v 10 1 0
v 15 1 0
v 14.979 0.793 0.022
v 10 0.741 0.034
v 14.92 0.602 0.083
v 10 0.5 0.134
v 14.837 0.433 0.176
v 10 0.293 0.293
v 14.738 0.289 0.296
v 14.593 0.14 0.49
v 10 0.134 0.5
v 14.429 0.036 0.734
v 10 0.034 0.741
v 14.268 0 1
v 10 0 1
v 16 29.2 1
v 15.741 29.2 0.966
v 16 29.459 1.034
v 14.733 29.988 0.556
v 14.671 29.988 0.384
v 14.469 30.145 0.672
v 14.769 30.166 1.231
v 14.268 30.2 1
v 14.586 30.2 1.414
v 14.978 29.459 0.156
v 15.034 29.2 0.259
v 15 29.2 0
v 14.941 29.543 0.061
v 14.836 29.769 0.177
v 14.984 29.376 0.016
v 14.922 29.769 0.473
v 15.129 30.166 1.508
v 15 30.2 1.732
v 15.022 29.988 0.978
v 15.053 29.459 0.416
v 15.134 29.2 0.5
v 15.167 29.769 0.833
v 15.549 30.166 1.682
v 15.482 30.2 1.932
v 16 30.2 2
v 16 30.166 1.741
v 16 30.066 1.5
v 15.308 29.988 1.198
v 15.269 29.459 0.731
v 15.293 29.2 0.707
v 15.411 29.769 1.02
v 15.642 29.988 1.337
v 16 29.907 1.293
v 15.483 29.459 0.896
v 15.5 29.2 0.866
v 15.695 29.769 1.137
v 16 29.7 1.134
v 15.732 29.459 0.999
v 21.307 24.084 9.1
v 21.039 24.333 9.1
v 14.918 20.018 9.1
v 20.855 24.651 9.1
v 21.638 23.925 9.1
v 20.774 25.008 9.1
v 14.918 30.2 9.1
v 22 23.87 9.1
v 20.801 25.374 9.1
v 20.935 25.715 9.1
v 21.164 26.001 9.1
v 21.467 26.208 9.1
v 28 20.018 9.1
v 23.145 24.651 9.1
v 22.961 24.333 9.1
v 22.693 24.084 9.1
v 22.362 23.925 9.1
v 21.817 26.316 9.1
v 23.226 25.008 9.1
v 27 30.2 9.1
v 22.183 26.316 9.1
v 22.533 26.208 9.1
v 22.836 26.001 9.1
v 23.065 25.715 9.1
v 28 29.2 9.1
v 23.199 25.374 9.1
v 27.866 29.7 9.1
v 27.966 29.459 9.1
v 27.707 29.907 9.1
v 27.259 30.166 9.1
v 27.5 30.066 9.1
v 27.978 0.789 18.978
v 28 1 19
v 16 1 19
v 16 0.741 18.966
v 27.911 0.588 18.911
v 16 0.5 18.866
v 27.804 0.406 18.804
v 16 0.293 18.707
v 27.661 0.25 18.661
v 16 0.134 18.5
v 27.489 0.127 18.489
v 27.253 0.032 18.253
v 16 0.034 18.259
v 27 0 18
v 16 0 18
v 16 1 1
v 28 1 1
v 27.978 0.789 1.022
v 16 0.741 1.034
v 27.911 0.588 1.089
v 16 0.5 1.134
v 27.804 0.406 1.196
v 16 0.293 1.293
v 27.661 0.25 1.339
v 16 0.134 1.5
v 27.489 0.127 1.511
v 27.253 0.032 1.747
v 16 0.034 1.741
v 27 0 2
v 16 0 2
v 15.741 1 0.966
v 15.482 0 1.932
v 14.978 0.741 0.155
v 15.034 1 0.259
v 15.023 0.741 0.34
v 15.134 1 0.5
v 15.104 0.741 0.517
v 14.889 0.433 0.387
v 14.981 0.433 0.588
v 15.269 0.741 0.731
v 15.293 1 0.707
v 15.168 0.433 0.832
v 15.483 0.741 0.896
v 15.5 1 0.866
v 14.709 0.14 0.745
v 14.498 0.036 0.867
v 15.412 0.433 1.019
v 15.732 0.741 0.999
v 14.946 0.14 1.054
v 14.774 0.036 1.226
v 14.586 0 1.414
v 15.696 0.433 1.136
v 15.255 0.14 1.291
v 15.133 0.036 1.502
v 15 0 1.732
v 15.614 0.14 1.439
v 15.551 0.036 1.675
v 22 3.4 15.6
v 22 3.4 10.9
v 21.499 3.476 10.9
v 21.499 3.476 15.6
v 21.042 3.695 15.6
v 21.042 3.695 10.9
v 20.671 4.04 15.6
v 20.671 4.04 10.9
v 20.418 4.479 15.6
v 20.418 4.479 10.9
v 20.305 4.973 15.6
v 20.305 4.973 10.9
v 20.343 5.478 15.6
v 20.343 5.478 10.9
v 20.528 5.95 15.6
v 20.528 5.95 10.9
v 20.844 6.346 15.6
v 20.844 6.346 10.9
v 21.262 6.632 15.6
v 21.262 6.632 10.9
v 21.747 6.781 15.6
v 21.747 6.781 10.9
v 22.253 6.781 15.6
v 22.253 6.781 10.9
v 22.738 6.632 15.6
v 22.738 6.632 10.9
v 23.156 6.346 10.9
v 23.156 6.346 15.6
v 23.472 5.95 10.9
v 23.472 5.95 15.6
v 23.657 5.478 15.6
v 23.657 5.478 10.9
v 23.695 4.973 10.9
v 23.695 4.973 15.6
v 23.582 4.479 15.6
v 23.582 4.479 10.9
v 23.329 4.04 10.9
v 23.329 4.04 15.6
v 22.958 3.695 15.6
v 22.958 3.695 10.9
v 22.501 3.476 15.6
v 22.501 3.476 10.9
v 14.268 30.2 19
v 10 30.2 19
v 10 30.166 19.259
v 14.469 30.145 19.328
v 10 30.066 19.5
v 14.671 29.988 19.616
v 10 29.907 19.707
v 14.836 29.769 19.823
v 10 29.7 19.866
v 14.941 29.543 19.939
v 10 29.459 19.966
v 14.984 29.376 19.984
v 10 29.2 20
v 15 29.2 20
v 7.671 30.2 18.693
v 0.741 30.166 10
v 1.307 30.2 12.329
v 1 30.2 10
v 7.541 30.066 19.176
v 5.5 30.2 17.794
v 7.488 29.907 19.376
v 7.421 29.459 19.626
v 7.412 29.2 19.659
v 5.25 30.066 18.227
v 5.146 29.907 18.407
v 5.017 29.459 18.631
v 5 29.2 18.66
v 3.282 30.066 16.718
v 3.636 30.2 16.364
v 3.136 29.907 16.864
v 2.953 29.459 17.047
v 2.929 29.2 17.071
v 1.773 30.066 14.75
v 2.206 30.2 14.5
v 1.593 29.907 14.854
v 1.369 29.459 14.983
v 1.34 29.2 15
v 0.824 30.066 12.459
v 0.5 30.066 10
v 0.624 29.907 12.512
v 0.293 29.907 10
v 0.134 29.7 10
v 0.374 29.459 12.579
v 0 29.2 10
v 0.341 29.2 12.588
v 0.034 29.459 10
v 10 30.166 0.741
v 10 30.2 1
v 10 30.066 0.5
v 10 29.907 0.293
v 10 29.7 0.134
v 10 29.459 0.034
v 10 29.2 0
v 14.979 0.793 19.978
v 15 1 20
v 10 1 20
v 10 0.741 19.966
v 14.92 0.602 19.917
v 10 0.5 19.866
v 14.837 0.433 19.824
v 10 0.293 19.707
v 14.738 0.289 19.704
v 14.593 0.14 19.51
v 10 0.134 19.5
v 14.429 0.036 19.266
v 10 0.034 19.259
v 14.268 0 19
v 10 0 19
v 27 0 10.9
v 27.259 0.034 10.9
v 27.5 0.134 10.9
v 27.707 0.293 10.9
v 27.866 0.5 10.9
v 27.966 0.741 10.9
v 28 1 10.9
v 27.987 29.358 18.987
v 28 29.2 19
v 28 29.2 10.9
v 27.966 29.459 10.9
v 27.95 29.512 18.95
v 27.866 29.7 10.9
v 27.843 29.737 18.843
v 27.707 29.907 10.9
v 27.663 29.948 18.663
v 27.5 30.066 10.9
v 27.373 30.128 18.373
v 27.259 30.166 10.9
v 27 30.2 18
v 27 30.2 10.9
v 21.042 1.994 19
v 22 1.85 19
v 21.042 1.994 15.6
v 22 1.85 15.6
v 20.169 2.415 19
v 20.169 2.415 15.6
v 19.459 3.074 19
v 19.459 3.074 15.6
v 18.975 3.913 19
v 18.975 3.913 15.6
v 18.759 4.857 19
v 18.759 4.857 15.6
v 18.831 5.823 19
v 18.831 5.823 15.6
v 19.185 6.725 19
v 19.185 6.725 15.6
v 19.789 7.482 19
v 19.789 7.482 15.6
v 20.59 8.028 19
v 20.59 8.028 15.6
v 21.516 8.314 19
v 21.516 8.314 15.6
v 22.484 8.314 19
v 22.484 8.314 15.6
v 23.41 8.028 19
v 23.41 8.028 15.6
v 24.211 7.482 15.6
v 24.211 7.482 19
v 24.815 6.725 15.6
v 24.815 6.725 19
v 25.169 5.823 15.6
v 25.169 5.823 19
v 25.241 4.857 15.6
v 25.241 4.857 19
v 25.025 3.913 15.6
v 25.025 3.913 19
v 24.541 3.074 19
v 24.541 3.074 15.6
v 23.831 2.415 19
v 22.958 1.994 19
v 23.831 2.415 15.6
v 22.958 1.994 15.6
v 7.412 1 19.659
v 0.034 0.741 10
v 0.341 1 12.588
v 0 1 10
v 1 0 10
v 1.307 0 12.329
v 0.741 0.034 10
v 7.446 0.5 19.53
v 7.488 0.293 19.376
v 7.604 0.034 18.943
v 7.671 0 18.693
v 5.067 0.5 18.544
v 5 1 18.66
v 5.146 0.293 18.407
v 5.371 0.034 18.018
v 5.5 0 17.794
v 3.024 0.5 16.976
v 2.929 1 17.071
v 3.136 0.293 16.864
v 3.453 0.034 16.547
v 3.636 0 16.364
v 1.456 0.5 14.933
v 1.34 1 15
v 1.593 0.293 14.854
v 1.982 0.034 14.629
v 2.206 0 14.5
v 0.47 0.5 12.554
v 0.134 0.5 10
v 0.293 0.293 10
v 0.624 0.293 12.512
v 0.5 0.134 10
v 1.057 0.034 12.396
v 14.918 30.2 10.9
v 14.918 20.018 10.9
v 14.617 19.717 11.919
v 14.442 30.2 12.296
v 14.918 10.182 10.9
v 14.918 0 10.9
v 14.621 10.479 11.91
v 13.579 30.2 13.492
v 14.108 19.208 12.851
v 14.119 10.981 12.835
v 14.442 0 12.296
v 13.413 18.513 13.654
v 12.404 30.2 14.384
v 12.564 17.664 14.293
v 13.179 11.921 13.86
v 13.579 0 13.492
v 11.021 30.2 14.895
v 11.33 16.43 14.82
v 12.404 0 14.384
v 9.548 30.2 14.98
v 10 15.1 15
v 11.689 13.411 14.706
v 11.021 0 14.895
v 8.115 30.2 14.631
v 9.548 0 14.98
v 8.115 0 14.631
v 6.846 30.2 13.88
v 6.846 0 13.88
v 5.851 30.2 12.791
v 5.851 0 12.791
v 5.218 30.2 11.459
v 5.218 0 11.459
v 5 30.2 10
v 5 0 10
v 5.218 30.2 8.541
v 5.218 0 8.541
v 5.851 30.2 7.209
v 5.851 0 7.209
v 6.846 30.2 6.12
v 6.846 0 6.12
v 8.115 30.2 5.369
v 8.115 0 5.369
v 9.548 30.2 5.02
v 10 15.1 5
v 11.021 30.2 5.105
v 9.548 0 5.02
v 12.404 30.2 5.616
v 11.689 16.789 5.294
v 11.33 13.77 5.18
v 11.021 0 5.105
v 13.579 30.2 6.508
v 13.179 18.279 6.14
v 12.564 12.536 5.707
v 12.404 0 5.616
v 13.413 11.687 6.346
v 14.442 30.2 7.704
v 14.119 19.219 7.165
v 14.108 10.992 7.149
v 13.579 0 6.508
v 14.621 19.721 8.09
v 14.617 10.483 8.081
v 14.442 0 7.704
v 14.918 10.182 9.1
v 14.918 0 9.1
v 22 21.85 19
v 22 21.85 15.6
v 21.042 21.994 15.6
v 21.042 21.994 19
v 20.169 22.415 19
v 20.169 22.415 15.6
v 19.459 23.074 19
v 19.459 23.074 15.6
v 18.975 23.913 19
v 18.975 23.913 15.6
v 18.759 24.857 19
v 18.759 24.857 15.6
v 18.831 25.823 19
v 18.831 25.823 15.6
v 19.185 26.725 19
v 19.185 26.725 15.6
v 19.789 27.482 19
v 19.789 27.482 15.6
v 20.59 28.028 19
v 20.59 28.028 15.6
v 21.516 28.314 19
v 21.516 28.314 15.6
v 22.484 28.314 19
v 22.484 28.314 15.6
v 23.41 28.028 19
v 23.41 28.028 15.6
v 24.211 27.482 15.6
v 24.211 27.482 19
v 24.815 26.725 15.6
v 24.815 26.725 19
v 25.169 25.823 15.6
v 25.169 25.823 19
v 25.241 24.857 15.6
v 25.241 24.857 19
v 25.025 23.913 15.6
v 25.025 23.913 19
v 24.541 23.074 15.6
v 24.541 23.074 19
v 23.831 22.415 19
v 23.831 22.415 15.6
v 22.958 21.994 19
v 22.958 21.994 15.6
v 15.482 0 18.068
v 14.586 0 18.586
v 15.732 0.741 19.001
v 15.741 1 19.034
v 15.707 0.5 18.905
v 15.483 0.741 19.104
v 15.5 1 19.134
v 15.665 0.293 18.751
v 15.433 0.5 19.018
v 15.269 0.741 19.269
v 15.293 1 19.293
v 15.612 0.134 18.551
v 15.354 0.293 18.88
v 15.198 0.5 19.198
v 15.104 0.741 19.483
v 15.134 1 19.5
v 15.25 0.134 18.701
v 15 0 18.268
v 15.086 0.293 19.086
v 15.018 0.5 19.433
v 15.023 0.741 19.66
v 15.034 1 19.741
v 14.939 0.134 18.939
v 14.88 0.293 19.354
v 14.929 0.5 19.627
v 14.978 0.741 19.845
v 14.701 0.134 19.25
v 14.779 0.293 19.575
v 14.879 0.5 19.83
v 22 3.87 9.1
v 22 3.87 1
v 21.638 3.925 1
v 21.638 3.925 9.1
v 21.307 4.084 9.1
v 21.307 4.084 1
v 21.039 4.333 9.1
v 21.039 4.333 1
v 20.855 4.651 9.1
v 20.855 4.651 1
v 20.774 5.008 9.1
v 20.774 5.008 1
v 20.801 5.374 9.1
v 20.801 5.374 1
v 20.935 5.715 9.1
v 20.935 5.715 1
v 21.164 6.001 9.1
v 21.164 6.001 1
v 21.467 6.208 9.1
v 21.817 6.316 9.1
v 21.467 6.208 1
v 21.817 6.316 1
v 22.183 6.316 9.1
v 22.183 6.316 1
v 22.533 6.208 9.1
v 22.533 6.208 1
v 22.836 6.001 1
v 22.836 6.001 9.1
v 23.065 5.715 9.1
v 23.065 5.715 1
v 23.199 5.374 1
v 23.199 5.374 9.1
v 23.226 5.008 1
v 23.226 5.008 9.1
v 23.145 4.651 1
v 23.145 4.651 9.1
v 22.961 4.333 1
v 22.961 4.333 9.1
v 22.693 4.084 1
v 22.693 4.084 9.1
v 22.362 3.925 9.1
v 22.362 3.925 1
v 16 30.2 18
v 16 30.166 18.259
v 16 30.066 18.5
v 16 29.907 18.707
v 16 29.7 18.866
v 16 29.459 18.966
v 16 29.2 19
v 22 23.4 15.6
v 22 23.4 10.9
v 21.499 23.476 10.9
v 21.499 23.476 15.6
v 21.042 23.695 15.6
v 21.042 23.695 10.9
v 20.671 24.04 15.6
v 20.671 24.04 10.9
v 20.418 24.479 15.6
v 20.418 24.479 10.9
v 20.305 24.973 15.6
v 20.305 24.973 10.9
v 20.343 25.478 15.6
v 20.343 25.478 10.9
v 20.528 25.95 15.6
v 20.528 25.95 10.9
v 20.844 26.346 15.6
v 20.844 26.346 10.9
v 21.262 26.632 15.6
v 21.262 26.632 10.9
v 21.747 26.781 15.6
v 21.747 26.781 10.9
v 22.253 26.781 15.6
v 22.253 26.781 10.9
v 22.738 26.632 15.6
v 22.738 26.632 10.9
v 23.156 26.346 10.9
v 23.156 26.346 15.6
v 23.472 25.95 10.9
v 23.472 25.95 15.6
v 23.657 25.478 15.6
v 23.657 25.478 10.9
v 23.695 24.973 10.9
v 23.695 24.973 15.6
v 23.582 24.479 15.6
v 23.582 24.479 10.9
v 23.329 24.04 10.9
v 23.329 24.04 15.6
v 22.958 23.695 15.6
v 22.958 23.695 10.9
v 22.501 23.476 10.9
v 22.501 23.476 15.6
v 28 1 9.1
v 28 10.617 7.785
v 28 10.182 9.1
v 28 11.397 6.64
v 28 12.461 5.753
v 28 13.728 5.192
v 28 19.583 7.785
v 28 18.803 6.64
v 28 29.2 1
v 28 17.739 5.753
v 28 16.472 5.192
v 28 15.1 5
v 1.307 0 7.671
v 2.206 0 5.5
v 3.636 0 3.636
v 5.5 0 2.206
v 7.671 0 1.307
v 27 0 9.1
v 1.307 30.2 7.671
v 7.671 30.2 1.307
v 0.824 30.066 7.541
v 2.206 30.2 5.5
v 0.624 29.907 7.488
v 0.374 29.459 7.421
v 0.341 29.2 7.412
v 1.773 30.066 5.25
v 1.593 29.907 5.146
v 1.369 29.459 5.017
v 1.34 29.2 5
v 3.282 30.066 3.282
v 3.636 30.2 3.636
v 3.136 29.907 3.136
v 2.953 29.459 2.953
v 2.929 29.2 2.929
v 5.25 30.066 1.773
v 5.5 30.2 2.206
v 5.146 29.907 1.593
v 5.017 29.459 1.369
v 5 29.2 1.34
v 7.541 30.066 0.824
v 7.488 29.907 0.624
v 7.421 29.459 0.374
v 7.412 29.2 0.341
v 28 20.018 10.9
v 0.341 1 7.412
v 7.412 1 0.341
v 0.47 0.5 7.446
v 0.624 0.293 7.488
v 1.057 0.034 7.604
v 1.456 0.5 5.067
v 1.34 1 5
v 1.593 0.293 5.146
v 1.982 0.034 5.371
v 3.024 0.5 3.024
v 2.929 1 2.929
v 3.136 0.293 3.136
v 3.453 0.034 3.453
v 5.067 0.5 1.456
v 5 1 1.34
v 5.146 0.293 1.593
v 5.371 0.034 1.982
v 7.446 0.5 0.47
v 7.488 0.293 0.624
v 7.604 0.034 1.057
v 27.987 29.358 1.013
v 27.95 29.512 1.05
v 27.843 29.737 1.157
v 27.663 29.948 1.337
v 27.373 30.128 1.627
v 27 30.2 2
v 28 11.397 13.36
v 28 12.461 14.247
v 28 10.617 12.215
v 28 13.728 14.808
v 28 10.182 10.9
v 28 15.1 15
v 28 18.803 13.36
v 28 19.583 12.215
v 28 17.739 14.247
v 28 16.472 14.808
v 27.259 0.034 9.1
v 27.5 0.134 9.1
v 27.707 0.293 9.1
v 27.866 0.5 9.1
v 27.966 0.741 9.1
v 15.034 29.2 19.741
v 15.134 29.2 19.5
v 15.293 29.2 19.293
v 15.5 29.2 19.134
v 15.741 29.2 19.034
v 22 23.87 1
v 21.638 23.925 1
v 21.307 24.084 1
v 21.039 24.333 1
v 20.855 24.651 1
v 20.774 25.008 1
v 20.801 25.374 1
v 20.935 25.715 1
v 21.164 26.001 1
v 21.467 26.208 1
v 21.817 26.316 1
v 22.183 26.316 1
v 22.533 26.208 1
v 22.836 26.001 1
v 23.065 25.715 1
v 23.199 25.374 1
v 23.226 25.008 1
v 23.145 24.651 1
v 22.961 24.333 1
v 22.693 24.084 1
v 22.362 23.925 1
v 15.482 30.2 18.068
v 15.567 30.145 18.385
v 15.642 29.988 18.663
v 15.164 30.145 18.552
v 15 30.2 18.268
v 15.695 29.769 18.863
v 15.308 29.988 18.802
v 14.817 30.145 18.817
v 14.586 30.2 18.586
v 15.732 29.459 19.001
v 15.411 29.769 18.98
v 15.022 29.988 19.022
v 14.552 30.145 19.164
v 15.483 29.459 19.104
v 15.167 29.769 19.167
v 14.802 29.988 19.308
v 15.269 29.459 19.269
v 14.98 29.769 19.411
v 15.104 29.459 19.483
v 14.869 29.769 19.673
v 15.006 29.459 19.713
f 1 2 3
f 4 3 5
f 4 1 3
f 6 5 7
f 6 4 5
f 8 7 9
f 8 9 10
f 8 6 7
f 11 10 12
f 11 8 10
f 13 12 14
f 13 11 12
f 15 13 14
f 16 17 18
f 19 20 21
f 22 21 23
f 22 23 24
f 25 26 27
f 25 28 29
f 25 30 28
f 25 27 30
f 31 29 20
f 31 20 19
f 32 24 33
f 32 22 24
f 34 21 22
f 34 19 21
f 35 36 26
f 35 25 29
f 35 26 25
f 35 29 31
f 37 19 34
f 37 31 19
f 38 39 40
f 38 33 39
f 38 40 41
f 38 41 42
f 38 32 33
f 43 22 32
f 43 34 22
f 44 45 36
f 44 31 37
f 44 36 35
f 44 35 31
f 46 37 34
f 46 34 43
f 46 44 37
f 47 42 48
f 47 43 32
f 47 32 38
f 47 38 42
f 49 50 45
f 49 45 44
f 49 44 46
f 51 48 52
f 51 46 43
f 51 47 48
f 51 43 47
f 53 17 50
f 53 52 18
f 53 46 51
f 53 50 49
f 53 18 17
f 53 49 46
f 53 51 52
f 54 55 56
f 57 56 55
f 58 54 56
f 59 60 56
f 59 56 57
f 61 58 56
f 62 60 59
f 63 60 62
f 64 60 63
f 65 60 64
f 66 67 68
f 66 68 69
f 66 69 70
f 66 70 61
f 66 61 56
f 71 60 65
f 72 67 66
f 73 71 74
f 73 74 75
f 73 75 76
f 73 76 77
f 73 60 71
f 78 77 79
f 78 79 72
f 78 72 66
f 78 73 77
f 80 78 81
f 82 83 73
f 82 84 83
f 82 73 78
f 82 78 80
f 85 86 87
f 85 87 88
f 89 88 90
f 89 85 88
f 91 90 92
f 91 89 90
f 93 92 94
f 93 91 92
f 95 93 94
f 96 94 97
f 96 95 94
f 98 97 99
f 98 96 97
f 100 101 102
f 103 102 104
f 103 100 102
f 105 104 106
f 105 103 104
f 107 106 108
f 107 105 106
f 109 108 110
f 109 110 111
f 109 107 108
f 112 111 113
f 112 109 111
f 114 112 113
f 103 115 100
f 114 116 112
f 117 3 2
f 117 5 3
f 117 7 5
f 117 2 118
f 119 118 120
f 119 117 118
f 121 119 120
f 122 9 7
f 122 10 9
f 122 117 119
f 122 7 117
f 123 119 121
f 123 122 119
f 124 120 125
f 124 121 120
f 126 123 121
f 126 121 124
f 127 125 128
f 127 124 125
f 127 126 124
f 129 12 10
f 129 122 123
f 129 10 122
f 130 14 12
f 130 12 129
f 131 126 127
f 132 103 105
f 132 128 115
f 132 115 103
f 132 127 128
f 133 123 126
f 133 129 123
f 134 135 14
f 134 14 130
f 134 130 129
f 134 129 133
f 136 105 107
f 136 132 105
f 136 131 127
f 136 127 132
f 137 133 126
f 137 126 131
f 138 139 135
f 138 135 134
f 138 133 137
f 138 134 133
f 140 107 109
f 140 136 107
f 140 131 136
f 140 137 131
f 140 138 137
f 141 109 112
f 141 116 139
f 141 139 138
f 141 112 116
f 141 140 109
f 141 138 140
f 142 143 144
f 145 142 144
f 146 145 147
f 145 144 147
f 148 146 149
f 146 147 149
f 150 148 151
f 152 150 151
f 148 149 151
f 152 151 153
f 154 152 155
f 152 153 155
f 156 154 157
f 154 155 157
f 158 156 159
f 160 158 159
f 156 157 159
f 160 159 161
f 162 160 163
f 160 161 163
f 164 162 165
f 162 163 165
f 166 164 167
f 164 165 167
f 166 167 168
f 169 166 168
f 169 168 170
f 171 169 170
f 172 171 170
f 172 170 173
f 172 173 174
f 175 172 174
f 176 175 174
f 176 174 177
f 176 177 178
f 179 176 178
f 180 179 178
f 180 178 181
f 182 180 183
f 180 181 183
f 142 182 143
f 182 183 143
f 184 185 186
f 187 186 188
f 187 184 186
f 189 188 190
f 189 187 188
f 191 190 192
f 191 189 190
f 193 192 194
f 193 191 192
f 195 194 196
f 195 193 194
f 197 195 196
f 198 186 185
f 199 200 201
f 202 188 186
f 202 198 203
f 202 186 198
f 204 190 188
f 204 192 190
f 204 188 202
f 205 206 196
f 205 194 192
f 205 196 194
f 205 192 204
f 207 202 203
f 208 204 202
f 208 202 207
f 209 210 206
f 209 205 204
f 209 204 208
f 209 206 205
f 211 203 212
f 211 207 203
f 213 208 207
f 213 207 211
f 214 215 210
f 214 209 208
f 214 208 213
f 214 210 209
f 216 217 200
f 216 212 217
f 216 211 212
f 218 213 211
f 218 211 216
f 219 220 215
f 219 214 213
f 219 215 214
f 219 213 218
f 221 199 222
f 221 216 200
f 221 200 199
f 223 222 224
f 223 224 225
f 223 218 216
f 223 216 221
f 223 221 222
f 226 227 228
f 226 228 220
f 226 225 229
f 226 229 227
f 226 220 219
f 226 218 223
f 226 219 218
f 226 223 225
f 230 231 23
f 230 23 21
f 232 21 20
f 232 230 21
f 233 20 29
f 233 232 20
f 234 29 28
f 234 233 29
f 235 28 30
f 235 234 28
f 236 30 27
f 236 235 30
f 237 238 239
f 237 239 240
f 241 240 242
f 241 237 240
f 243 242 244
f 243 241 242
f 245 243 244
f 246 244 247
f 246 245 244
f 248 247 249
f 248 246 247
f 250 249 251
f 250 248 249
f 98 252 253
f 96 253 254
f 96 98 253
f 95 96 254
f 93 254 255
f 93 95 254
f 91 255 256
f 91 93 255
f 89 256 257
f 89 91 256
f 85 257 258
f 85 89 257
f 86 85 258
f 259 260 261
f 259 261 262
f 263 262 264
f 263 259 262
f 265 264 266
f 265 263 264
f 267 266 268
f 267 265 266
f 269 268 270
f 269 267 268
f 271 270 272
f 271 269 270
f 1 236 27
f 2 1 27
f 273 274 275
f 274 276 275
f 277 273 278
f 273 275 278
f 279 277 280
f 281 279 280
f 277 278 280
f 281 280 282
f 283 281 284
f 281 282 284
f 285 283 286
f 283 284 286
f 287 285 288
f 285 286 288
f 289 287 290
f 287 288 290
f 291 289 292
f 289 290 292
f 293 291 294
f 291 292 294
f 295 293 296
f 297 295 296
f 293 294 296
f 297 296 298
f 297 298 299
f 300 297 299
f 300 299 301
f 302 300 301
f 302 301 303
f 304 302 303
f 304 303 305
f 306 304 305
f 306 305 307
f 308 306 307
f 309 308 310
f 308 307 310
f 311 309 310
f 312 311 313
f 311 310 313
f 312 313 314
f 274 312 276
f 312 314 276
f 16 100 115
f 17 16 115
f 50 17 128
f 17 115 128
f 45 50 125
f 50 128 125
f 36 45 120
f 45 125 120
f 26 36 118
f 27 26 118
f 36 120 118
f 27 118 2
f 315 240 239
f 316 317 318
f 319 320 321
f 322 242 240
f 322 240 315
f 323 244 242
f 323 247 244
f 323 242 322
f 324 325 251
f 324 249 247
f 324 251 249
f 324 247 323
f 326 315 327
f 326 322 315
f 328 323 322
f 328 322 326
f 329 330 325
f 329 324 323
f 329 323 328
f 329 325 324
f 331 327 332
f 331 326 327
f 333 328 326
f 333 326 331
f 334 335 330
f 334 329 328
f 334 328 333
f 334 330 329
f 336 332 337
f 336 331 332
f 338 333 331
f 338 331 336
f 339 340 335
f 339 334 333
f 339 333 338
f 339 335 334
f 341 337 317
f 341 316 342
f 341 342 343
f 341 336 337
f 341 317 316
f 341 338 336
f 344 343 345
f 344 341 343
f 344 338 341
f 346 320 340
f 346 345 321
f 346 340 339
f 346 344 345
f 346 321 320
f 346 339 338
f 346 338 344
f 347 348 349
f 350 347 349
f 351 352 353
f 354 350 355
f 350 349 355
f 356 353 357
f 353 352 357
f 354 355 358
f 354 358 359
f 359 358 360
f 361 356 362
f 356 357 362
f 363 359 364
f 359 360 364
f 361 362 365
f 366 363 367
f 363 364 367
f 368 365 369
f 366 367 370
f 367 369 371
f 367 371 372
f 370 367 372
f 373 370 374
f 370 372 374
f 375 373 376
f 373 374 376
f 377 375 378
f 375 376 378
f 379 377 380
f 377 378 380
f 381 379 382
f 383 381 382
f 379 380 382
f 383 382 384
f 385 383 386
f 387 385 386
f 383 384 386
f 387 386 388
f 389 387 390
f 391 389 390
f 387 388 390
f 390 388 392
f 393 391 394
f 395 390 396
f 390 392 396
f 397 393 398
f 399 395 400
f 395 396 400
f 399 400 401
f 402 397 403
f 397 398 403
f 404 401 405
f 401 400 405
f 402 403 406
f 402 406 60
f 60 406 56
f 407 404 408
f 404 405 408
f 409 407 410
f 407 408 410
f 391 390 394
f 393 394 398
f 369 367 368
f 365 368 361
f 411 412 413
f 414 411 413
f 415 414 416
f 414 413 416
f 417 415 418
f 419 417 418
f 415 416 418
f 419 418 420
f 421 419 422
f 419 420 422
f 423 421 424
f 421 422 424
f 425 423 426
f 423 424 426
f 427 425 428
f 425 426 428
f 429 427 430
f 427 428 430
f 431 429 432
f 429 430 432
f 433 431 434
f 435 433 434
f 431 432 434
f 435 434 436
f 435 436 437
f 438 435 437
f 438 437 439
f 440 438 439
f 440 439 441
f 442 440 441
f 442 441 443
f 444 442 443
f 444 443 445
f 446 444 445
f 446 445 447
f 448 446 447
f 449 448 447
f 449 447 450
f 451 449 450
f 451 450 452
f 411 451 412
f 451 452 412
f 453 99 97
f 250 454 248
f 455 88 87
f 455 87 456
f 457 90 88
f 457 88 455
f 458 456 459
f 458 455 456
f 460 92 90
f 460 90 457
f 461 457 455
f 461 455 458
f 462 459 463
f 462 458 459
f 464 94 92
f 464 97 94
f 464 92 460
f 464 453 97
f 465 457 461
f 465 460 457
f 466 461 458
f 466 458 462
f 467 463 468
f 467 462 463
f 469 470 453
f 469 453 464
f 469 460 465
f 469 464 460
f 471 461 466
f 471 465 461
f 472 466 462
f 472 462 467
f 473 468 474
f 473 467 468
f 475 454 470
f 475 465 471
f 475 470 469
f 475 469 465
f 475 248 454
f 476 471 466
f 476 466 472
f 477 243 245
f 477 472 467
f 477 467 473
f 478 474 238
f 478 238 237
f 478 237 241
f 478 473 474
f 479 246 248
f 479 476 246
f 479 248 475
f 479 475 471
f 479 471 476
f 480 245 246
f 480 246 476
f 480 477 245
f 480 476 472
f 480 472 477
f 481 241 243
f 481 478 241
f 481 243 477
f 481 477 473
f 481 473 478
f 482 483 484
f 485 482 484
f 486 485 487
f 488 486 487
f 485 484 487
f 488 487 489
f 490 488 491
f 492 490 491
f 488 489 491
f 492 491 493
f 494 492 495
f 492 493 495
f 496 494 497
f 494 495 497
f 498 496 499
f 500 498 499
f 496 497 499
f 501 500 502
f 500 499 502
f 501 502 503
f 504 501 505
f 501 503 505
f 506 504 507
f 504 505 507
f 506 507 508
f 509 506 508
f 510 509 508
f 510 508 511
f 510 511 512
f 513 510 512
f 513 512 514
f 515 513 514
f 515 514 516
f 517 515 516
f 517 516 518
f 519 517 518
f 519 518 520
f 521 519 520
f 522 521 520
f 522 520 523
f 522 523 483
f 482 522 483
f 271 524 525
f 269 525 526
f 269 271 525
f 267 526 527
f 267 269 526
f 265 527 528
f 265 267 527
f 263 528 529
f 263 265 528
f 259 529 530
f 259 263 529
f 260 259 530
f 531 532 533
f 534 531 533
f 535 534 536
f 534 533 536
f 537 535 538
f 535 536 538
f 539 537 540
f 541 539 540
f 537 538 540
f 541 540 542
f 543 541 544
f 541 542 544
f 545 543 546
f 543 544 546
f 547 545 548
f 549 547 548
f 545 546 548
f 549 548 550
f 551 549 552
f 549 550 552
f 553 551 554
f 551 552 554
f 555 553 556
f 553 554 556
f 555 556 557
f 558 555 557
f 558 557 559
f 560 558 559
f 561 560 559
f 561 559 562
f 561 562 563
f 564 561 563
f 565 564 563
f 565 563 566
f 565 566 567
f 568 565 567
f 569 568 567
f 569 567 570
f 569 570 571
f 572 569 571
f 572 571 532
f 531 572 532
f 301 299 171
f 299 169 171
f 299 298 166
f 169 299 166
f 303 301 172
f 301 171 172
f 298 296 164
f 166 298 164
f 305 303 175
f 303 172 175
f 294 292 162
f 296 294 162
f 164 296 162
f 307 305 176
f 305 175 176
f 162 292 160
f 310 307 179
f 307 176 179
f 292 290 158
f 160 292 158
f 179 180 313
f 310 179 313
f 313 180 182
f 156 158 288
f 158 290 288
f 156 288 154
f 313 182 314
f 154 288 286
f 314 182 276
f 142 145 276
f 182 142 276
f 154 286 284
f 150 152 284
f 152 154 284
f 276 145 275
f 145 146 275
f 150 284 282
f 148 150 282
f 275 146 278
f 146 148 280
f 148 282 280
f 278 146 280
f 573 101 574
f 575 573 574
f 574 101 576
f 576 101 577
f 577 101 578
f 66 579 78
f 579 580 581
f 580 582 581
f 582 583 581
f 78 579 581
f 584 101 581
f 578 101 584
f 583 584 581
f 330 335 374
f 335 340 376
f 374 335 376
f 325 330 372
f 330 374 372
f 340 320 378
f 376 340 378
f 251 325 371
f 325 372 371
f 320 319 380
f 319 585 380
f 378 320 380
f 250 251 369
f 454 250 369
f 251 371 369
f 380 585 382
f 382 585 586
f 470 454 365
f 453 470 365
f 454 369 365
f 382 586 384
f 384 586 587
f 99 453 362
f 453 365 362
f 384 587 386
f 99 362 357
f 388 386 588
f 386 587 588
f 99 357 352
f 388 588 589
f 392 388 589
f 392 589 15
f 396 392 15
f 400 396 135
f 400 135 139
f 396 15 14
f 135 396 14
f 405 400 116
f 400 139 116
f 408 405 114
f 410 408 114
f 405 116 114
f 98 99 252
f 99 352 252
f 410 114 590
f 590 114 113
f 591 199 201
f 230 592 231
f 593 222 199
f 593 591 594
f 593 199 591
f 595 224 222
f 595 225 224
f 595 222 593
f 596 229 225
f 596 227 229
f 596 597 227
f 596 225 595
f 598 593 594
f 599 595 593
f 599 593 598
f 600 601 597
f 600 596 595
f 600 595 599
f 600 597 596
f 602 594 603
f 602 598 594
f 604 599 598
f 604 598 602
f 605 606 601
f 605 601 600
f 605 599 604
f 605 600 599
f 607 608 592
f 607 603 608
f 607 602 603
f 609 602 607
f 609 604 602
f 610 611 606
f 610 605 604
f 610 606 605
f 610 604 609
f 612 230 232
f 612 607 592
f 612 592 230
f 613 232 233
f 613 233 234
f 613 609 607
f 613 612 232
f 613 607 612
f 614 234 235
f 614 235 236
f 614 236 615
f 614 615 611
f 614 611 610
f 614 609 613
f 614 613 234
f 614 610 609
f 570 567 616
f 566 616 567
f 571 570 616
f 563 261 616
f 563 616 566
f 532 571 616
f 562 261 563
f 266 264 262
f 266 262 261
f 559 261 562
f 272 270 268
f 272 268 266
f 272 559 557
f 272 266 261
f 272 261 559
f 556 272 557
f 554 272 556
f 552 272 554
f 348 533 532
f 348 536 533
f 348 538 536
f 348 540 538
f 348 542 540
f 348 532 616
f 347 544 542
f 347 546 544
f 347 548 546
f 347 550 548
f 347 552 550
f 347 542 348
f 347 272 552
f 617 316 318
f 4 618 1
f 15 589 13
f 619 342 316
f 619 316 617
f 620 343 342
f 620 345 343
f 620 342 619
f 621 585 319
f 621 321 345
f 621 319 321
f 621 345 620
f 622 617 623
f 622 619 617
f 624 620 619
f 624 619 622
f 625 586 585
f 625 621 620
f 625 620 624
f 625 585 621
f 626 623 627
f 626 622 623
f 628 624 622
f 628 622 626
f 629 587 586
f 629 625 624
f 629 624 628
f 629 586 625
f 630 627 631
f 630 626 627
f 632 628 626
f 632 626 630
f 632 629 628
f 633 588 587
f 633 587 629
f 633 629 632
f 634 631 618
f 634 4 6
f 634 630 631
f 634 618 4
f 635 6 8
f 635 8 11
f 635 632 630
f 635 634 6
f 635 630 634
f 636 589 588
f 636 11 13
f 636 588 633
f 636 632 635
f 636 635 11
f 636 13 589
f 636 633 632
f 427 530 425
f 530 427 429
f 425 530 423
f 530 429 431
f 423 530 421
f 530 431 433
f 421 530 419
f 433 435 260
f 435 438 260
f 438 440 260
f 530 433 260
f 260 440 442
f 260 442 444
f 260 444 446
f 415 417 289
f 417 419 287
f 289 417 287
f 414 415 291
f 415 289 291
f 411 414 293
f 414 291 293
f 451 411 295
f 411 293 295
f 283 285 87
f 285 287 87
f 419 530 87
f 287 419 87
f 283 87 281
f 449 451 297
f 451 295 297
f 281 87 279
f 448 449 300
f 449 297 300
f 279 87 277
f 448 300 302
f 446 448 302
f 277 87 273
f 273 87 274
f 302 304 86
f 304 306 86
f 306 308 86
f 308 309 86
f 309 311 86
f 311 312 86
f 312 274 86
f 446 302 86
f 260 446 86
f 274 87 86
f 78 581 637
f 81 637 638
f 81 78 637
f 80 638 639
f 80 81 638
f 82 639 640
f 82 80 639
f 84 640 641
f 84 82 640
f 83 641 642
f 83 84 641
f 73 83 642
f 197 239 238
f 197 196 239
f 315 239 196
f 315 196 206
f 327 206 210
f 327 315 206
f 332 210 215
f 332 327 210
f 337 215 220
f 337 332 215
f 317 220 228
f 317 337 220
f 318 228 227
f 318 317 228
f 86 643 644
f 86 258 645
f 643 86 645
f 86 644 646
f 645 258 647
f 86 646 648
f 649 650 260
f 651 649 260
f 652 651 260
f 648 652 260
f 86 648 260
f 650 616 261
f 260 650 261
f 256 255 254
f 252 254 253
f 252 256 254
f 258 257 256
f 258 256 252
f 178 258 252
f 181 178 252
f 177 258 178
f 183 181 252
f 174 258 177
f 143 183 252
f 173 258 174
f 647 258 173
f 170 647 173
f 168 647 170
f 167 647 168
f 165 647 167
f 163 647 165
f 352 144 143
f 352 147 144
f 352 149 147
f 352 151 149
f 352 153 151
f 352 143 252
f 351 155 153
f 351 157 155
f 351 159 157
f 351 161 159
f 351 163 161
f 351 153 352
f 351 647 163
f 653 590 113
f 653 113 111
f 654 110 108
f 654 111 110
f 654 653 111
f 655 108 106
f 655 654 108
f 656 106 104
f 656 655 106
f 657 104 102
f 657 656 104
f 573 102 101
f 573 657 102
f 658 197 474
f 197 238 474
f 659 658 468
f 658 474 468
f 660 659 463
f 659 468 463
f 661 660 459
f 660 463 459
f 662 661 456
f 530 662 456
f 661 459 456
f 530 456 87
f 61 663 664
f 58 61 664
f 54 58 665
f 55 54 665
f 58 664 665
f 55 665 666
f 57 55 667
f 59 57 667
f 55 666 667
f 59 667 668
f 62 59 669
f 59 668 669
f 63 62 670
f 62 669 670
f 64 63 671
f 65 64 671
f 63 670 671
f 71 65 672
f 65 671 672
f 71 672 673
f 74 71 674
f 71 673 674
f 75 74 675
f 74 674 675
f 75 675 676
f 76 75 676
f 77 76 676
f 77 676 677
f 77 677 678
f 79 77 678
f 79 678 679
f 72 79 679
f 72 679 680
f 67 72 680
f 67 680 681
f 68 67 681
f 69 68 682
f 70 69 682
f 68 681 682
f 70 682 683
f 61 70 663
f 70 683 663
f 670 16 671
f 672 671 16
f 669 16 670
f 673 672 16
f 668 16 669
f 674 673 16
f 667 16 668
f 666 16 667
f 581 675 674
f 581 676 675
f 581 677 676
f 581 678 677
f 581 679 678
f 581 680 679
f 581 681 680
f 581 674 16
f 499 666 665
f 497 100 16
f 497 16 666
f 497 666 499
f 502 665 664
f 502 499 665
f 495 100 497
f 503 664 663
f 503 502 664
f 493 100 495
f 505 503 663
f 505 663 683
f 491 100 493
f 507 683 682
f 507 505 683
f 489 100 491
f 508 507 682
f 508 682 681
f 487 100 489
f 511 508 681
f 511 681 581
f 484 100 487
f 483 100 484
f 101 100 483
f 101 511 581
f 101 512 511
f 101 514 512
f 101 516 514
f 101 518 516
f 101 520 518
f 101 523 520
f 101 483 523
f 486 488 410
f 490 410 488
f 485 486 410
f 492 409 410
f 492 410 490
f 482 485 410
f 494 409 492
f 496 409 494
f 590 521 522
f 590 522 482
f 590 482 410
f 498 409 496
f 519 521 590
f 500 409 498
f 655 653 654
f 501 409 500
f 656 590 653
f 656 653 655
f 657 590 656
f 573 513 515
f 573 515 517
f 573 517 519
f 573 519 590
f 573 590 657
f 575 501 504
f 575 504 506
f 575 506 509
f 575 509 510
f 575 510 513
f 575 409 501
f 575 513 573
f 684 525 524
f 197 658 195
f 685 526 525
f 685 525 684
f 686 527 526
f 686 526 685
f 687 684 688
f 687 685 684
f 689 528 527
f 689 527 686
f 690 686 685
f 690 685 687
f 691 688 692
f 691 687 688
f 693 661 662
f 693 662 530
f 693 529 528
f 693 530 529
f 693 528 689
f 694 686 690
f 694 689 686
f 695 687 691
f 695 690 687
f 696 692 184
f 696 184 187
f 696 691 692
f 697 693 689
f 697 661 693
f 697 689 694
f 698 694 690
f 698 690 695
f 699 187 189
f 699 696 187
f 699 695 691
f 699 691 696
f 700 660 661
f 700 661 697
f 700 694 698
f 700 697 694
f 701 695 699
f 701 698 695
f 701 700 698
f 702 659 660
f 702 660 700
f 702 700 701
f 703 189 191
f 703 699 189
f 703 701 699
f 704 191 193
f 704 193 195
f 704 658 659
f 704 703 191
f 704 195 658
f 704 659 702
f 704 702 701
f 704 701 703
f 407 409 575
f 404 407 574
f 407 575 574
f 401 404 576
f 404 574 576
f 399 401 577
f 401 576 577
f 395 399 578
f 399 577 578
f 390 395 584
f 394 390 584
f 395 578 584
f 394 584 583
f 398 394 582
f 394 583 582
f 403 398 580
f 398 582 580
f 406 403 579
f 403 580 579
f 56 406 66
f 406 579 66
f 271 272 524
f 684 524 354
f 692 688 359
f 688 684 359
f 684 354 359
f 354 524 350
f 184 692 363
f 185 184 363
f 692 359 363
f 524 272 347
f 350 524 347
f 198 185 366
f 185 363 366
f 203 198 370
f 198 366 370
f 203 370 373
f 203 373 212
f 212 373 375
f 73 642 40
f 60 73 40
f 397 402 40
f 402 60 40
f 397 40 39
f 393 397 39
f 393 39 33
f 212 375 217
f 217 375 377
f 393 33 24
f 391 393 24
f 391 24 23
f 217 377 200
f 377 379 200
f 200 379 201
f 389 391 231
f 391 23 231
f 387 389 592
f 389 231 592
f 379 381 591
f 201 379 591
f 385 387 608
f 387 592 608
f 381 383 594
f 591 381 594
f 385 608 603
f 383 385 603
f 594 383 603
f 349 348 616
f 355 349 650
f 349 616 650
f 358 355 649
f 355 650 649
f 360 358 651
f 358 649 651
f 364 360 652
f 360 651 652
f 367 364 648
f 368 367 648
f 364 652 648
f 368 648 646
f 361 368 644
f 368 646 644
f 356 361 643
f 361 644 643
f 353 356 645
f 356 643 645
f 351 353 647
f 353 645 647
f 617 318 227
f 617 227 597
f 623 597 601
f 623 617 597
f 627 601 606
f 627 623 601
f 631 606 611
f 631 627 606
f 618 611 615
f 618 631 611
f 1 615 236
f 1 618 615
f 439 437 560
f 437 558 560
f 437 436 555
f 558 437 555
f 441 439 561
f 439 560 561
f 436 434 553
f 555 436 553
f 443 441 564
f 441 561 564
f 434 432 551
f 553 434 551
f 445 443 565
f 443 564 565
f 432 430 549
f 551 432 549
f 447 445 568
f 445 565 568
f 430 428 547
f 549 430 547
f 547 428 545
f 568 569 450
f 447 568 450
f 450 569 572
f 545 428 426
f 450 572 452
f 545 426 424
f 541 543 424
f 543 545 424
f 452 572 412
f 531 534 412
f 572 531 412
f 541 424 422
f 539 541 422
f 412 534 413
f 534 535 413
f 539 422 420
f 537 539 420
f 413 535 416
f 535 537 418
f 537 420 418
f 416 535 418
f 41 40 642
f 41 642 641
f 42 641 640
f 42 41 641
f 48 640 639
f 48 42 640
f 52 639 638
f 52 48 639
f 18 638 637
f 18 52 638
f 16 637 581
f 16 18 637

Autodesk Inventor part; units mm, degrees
ref_plane "YZ Plane" through (0, 0, 0) normal (1, 0, 0) x (0, 1, 0)
ref_plane "XZ Plane" through (0, 0, 0) normal (0, 1, 0) x (-1, 0, 0)
ref_plane "XY Plane" through (0, 0, 0) normal (0, 0, 1) x (1, 0, 0)
sketch "Sketch1" plane through (0, 0, 0) normal (0, 0, 1) x (1, 0, 0)
  line L0 (28, 30.2) -> (0, 30.2)
  line L1 (0, 30.2) -> (0, 0)
  line L2 (0, 15.1) -> (28, 15.1) construction
  line L3 (28, 0) -> (28, 30.2)
  line L4 (0, 0) -> (28, 0)
  line L5 (20, 15.1) -> (20, 30.2) construction
  dimension "d0" = 30.2
  dimension "d3" = 28
  dimension "d26" = 20
  dimension "d27" = 8
extrude "Extrusion1" add sketch "Sketch1" along normal blind 20
sketch "Sketch2" plane through (0, 30.2, 0) normal (0, 1, 0) x (1, 0, 0)
  line L0 (0, 0) -> (0, -20) construction
  line L1 (0, 0) -> (28, 0) construction
  line L2 (10, -10) -> (0, -10) construction
  line L3 (0, 0) -> (0, -20) construction
  dimension "d48" = 10
hole "Hole1" at (10, 30.2, 10) direction (0, -1, 0) diameter 10 end through all
sketch "Sketch3" plane through (0, 0, 0) normal (0, -1, 0) x (1, 0, 0)
  line L0 (28, 20) -> (15, 20)
  line L1 (16, 19) -> (28, 19)
  line L2 (28, 19) -> (28, 20)
  circle A0 centre (16, 20) radius 1 construction
  arc A1 (15, 20) -> (16, 19) centre (16, 20) ccw
  circle A2 centre (10, 10) radius 5 construction
  line L3 (15, 10) -> (15, 20) construction
  line L4 (0, 20) -> (28, 20) construction
  line L5 (28, 0) -> (28, 20) construction
  line L6 (10, 10) -> (15, 10) construction
  line L7 (28, 0) -> (15, 0)
  line L8 (16, 1) -> (28, 1)
  line L9 (28, 1) -> (28, 0)
  arc A3 (16, 1) -> (15, 0) centre (16, 0) ccw
  point P0 (0, 0)
  dimension "d15" = 2
  dimension "d46" = 18
extrude "Extrusion2" cut sketch "Sketch3" against normal through all
fillet "Fillet1" radius 10 2 edges at (0, 15.1, 0) (0, 15.1, 20)
sketch "Sketch4" plane through (15, 30.2, 20) normal (0, 1, 0) x (1, 0, 0)
  circle A0 centre (-5, 10) radius 5 construction
  line L0 (-5, 10) -> (13, 10) construction
  line L1 (-5, 10.9) -> (13, 10.9)
  line L2 (13, 10.9) -> (13, 9.1)
  line L3 (13, 9.1) -> (-5, 9.1)
  line L4 (-5, 9.1) -> (-5, 10.9)
  line L5 (-5, 10.9) -> (13, 9.1) construction
  line L6 (13, 10.9) -> (-5, 9.1) construction
  line L7 (13, 19) -> (13, 1) construction
  point P0 (4, 10)
  point P1 (12, 15)
  point P2 (13, 1)
  point P3 (12, 18)
  dimension "d19" = 1.8
extrude "Extrusion3" cut sketch "Sketch4" against normal through all
sketch "Sketch5" plane through (28, 0, 19) normal (1, 0, 0) x (0, 0, -1)
  circle A0 centre (9, 15.1) radius 5
  line L0 (0, 0) -> (0, 30.2) construction
  line L1 (0, 0) -> (18, 30.2) construction
  line L2 (18, 0) -> (0, 30.2) construction
  line L3 (18, 0) -> (18, 30.2) construction
  dimension "d22" = 10
extrude "Extrusion4" cut sketch "Sketch5" against normal up to surface
sketch "Sketch6" plane through (16, 0, 19) normal (0, 0, 1) x (1, 0, 0)
  line L0 (0, 30.2) -> (12, 30.2) construction
  line L1 (0, 0) -> (0, 30.2) construction
  line L2 (12, 0) -> (0, 0) construction
  line L3 (12, 30.2) -> (12, 0) construction
  line L4 (6, 0) -> (6, 30.2) construction
  line L5 (6, 15.1) -> (0, 15.1) construction
  point P0 (-16, 0)
  point P1 (6, 5.1)
  point P2 (6, 25.1)
  dimension "d28" = 10
hole "Hole2" at (22, 5.1, 19) at (22, 25.1, 19) direction (0, 0, -1) diameter 3.4 depth 8.1 counterbore diameter 6.5 counterbore depth 3.4 clearance for "Socket Head Cap Screw ISO 4762" size "M3" standard "ISO"
sketch "Sketch7" plane through (14.9183, 30.2, 9.1) normal (0, 0, 1) x (1, 0, 0)
  point P0 (-14.9183, -30.2)
  point P1 (7.0817, -5.1)
  point P2 (7.0817, -25.1)
hole "Hole3" at (22, 25.1, 9.1) at (22, 5.1, 9.1) direction (0, 0, -1) diameter 2.459 depth 8.8 tip angle 118 thread size "M3x0.5" class "6H" standard "ISO Metric profile"
ref_plane "Work Plane1" through (16, 15.1, 19) normal (0, -1, 0) x (1, 0, 0)
fillet "Fillet2" radius 1 18 edges at (15.2929, 30.2, 19.2929) (22, 30.2, 19) (2.9289, 30.2, 2.9289) (12.4999, 30.2, 0) (12.4999, 30.2, 20) (15.2929, 30.2, 0.7071) (22, 30.2, 1) (15.2929, 0, 19.2929) (22, 0, 19) (12.4999, 0, 20) (12.4999, 0, 0) (2.9289, 0, 2.9289) (15.2929, 0, 0.7071) (22, 0, 1) (28, 0, 5.05) (28, 0, 14.95) (28, 30.2, 14.95) (28, 30.2, 5.05)
equation "\"d0\" = YawnFixation_Width"
equation "\"d26\" = YawnShaft_Diameter + Aufmass_ShaftFixationSide"
equation "\"d4\" = YawnShaft_Diameter + Aufmass_ShaftFixationSide"
equation "\"d48\" = 0.5 * d4"
equation "\"d7\" = YawnShaft_Diameter"
equation "\"d18\" = 0.5 * d4"
equation "\"d22\" = Shaft_DiaOut"
equation "\"Aufmass_ShaftFixationSide\" = 10"
equation "\"YawnFixation_Width\" = 30.2"
equation "\"YawnShaft_Diameter\" = 10"
equation "\"Shaft_DiaOut\" = 10"
properties part number "UpperArm_Yawn_Fixture" material "PBT Plastic"
